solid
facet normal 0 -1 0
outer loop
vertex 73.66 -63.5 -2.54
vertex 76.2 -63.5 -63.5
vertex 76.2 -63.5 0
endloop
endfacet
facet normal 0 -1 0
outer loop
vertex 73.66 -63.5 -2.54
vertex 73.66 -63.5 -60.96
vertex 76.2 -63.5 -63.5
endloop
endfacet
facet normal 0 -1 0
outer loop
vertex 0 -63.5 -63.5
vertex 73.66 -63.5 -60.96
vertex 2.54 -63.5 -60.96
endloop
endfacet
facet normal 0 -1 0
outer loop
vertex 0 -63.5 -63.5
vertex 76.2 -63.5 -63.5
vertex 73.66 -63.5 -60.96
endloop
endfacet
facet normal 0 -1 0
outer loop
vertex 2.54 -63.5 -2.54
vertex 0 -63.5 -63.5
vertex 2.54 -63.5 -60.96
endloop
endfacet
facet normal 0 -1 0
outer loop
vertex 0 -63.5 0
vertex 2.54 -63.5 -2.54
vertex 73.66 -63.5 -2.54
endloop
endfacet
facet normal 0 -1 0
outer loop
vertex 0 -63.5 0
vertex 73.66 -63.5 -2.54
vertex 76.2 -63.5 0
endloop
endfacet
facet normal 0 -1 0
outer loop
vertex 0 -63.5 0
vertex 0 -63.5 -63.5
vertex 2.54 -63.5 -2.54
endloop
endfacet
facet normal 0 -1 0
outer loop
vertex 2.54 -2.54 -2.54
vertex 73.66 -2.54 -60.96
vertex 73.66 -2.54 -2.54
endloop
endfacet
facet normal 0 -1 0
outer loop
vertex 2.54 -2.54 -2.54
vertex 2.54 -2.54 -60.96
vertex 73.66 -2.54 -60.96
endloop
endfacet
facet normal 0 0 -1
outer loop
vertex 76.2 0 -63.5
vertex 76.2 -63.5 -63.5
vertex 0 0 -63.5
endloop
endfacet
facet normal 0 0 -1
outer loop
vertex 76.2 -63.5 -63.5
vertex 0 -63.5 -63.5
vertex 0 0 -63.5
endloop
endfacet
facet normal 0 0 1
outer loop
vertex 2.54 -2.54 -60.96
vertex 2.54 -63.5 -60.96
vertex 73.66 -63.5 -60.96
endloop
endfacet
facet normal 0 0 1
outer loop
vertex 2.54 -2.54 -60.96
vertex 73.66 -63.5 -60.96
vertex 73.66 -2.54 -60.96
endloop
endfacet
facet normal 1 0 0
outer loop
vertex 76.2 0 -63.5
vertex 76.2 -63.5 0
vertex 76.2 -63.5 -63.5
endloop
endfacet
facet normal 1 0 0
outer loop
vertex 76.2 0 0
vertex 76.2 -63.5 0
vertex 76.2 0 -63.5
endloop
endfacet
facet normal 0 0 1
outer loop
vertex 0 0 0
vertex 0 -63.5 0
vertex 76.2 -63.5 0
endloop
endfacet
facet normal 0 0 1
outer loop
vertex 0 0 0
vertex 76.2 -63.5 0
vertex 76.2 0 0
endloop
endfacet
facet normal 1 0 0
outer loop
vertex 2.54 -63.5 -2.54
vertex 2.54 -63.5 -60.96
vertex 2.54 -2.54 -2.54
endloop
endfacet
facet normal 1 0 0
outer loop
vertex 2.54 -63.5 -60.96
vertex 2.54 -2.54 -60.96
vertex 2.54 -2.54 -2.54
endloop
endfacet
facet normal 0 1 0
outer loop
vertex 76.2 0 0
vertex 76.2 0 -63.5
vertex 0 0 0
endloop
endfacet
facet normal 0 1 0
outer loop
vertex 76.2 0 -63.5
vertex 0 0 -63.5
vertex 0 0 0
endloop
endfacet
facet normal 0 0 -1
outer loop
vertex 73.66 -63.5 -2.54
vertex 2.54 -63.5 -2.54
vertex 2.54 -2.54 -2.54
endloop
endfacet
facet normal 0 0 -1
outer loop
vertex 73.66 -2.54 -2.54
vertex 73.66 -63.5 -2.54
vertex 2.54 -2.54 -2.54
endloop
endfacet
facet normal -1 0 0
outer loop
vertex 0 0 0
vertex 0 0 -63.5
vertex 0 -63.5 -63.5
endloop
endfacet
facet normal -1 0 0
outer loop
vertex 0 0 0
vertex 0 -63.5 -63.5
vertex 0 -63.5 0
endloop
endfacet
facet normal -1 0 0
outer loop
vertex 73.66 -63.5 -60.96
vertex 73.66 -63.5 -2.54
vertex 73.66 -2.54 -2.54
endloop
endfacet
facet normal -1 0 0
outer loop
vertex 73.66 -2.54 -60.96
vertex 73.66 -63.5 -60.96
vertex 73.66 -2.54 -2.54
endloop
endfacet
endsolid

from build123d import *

# Parameters (mm, degrees)
F0_W      = 12.7
F0_H      = 63.5
F1_DEPTH  = 63.5
F1_FACE_W = 63.5
F1_FACE_H = 63.5
F2_DEPTH  = 63.5
F3_T      = -2.54


with BuildPart() as f1:
    # F0 (on Front) → F1 (new body)
    with BuildSketch(Plane.XZ):
        with Locations((6.35, -31.75)):
            Rectangle(F0_W, F0_H)
    extrude(amount=F1_DEPTH)

    # F1_face (on face) → F2 (join)
    with BuildSketch(Plane(origin=(12.7, -31.75, -31.75), x_dir=(0, 1, 0), z_dir=(1, 0, 0))):
        Rectangle(F1_FACE_W, F1_FACE_H)
    extrude(amount=F2_DEPTH)

    # F3
    f3_openings = [f1.faces().sort_by_distance(p)[0] for p in [
        (38.1, -63.5, -31.75),
    ]]
    offset(amount=F3_T, openings=f3_openings)


solid = f1.part
